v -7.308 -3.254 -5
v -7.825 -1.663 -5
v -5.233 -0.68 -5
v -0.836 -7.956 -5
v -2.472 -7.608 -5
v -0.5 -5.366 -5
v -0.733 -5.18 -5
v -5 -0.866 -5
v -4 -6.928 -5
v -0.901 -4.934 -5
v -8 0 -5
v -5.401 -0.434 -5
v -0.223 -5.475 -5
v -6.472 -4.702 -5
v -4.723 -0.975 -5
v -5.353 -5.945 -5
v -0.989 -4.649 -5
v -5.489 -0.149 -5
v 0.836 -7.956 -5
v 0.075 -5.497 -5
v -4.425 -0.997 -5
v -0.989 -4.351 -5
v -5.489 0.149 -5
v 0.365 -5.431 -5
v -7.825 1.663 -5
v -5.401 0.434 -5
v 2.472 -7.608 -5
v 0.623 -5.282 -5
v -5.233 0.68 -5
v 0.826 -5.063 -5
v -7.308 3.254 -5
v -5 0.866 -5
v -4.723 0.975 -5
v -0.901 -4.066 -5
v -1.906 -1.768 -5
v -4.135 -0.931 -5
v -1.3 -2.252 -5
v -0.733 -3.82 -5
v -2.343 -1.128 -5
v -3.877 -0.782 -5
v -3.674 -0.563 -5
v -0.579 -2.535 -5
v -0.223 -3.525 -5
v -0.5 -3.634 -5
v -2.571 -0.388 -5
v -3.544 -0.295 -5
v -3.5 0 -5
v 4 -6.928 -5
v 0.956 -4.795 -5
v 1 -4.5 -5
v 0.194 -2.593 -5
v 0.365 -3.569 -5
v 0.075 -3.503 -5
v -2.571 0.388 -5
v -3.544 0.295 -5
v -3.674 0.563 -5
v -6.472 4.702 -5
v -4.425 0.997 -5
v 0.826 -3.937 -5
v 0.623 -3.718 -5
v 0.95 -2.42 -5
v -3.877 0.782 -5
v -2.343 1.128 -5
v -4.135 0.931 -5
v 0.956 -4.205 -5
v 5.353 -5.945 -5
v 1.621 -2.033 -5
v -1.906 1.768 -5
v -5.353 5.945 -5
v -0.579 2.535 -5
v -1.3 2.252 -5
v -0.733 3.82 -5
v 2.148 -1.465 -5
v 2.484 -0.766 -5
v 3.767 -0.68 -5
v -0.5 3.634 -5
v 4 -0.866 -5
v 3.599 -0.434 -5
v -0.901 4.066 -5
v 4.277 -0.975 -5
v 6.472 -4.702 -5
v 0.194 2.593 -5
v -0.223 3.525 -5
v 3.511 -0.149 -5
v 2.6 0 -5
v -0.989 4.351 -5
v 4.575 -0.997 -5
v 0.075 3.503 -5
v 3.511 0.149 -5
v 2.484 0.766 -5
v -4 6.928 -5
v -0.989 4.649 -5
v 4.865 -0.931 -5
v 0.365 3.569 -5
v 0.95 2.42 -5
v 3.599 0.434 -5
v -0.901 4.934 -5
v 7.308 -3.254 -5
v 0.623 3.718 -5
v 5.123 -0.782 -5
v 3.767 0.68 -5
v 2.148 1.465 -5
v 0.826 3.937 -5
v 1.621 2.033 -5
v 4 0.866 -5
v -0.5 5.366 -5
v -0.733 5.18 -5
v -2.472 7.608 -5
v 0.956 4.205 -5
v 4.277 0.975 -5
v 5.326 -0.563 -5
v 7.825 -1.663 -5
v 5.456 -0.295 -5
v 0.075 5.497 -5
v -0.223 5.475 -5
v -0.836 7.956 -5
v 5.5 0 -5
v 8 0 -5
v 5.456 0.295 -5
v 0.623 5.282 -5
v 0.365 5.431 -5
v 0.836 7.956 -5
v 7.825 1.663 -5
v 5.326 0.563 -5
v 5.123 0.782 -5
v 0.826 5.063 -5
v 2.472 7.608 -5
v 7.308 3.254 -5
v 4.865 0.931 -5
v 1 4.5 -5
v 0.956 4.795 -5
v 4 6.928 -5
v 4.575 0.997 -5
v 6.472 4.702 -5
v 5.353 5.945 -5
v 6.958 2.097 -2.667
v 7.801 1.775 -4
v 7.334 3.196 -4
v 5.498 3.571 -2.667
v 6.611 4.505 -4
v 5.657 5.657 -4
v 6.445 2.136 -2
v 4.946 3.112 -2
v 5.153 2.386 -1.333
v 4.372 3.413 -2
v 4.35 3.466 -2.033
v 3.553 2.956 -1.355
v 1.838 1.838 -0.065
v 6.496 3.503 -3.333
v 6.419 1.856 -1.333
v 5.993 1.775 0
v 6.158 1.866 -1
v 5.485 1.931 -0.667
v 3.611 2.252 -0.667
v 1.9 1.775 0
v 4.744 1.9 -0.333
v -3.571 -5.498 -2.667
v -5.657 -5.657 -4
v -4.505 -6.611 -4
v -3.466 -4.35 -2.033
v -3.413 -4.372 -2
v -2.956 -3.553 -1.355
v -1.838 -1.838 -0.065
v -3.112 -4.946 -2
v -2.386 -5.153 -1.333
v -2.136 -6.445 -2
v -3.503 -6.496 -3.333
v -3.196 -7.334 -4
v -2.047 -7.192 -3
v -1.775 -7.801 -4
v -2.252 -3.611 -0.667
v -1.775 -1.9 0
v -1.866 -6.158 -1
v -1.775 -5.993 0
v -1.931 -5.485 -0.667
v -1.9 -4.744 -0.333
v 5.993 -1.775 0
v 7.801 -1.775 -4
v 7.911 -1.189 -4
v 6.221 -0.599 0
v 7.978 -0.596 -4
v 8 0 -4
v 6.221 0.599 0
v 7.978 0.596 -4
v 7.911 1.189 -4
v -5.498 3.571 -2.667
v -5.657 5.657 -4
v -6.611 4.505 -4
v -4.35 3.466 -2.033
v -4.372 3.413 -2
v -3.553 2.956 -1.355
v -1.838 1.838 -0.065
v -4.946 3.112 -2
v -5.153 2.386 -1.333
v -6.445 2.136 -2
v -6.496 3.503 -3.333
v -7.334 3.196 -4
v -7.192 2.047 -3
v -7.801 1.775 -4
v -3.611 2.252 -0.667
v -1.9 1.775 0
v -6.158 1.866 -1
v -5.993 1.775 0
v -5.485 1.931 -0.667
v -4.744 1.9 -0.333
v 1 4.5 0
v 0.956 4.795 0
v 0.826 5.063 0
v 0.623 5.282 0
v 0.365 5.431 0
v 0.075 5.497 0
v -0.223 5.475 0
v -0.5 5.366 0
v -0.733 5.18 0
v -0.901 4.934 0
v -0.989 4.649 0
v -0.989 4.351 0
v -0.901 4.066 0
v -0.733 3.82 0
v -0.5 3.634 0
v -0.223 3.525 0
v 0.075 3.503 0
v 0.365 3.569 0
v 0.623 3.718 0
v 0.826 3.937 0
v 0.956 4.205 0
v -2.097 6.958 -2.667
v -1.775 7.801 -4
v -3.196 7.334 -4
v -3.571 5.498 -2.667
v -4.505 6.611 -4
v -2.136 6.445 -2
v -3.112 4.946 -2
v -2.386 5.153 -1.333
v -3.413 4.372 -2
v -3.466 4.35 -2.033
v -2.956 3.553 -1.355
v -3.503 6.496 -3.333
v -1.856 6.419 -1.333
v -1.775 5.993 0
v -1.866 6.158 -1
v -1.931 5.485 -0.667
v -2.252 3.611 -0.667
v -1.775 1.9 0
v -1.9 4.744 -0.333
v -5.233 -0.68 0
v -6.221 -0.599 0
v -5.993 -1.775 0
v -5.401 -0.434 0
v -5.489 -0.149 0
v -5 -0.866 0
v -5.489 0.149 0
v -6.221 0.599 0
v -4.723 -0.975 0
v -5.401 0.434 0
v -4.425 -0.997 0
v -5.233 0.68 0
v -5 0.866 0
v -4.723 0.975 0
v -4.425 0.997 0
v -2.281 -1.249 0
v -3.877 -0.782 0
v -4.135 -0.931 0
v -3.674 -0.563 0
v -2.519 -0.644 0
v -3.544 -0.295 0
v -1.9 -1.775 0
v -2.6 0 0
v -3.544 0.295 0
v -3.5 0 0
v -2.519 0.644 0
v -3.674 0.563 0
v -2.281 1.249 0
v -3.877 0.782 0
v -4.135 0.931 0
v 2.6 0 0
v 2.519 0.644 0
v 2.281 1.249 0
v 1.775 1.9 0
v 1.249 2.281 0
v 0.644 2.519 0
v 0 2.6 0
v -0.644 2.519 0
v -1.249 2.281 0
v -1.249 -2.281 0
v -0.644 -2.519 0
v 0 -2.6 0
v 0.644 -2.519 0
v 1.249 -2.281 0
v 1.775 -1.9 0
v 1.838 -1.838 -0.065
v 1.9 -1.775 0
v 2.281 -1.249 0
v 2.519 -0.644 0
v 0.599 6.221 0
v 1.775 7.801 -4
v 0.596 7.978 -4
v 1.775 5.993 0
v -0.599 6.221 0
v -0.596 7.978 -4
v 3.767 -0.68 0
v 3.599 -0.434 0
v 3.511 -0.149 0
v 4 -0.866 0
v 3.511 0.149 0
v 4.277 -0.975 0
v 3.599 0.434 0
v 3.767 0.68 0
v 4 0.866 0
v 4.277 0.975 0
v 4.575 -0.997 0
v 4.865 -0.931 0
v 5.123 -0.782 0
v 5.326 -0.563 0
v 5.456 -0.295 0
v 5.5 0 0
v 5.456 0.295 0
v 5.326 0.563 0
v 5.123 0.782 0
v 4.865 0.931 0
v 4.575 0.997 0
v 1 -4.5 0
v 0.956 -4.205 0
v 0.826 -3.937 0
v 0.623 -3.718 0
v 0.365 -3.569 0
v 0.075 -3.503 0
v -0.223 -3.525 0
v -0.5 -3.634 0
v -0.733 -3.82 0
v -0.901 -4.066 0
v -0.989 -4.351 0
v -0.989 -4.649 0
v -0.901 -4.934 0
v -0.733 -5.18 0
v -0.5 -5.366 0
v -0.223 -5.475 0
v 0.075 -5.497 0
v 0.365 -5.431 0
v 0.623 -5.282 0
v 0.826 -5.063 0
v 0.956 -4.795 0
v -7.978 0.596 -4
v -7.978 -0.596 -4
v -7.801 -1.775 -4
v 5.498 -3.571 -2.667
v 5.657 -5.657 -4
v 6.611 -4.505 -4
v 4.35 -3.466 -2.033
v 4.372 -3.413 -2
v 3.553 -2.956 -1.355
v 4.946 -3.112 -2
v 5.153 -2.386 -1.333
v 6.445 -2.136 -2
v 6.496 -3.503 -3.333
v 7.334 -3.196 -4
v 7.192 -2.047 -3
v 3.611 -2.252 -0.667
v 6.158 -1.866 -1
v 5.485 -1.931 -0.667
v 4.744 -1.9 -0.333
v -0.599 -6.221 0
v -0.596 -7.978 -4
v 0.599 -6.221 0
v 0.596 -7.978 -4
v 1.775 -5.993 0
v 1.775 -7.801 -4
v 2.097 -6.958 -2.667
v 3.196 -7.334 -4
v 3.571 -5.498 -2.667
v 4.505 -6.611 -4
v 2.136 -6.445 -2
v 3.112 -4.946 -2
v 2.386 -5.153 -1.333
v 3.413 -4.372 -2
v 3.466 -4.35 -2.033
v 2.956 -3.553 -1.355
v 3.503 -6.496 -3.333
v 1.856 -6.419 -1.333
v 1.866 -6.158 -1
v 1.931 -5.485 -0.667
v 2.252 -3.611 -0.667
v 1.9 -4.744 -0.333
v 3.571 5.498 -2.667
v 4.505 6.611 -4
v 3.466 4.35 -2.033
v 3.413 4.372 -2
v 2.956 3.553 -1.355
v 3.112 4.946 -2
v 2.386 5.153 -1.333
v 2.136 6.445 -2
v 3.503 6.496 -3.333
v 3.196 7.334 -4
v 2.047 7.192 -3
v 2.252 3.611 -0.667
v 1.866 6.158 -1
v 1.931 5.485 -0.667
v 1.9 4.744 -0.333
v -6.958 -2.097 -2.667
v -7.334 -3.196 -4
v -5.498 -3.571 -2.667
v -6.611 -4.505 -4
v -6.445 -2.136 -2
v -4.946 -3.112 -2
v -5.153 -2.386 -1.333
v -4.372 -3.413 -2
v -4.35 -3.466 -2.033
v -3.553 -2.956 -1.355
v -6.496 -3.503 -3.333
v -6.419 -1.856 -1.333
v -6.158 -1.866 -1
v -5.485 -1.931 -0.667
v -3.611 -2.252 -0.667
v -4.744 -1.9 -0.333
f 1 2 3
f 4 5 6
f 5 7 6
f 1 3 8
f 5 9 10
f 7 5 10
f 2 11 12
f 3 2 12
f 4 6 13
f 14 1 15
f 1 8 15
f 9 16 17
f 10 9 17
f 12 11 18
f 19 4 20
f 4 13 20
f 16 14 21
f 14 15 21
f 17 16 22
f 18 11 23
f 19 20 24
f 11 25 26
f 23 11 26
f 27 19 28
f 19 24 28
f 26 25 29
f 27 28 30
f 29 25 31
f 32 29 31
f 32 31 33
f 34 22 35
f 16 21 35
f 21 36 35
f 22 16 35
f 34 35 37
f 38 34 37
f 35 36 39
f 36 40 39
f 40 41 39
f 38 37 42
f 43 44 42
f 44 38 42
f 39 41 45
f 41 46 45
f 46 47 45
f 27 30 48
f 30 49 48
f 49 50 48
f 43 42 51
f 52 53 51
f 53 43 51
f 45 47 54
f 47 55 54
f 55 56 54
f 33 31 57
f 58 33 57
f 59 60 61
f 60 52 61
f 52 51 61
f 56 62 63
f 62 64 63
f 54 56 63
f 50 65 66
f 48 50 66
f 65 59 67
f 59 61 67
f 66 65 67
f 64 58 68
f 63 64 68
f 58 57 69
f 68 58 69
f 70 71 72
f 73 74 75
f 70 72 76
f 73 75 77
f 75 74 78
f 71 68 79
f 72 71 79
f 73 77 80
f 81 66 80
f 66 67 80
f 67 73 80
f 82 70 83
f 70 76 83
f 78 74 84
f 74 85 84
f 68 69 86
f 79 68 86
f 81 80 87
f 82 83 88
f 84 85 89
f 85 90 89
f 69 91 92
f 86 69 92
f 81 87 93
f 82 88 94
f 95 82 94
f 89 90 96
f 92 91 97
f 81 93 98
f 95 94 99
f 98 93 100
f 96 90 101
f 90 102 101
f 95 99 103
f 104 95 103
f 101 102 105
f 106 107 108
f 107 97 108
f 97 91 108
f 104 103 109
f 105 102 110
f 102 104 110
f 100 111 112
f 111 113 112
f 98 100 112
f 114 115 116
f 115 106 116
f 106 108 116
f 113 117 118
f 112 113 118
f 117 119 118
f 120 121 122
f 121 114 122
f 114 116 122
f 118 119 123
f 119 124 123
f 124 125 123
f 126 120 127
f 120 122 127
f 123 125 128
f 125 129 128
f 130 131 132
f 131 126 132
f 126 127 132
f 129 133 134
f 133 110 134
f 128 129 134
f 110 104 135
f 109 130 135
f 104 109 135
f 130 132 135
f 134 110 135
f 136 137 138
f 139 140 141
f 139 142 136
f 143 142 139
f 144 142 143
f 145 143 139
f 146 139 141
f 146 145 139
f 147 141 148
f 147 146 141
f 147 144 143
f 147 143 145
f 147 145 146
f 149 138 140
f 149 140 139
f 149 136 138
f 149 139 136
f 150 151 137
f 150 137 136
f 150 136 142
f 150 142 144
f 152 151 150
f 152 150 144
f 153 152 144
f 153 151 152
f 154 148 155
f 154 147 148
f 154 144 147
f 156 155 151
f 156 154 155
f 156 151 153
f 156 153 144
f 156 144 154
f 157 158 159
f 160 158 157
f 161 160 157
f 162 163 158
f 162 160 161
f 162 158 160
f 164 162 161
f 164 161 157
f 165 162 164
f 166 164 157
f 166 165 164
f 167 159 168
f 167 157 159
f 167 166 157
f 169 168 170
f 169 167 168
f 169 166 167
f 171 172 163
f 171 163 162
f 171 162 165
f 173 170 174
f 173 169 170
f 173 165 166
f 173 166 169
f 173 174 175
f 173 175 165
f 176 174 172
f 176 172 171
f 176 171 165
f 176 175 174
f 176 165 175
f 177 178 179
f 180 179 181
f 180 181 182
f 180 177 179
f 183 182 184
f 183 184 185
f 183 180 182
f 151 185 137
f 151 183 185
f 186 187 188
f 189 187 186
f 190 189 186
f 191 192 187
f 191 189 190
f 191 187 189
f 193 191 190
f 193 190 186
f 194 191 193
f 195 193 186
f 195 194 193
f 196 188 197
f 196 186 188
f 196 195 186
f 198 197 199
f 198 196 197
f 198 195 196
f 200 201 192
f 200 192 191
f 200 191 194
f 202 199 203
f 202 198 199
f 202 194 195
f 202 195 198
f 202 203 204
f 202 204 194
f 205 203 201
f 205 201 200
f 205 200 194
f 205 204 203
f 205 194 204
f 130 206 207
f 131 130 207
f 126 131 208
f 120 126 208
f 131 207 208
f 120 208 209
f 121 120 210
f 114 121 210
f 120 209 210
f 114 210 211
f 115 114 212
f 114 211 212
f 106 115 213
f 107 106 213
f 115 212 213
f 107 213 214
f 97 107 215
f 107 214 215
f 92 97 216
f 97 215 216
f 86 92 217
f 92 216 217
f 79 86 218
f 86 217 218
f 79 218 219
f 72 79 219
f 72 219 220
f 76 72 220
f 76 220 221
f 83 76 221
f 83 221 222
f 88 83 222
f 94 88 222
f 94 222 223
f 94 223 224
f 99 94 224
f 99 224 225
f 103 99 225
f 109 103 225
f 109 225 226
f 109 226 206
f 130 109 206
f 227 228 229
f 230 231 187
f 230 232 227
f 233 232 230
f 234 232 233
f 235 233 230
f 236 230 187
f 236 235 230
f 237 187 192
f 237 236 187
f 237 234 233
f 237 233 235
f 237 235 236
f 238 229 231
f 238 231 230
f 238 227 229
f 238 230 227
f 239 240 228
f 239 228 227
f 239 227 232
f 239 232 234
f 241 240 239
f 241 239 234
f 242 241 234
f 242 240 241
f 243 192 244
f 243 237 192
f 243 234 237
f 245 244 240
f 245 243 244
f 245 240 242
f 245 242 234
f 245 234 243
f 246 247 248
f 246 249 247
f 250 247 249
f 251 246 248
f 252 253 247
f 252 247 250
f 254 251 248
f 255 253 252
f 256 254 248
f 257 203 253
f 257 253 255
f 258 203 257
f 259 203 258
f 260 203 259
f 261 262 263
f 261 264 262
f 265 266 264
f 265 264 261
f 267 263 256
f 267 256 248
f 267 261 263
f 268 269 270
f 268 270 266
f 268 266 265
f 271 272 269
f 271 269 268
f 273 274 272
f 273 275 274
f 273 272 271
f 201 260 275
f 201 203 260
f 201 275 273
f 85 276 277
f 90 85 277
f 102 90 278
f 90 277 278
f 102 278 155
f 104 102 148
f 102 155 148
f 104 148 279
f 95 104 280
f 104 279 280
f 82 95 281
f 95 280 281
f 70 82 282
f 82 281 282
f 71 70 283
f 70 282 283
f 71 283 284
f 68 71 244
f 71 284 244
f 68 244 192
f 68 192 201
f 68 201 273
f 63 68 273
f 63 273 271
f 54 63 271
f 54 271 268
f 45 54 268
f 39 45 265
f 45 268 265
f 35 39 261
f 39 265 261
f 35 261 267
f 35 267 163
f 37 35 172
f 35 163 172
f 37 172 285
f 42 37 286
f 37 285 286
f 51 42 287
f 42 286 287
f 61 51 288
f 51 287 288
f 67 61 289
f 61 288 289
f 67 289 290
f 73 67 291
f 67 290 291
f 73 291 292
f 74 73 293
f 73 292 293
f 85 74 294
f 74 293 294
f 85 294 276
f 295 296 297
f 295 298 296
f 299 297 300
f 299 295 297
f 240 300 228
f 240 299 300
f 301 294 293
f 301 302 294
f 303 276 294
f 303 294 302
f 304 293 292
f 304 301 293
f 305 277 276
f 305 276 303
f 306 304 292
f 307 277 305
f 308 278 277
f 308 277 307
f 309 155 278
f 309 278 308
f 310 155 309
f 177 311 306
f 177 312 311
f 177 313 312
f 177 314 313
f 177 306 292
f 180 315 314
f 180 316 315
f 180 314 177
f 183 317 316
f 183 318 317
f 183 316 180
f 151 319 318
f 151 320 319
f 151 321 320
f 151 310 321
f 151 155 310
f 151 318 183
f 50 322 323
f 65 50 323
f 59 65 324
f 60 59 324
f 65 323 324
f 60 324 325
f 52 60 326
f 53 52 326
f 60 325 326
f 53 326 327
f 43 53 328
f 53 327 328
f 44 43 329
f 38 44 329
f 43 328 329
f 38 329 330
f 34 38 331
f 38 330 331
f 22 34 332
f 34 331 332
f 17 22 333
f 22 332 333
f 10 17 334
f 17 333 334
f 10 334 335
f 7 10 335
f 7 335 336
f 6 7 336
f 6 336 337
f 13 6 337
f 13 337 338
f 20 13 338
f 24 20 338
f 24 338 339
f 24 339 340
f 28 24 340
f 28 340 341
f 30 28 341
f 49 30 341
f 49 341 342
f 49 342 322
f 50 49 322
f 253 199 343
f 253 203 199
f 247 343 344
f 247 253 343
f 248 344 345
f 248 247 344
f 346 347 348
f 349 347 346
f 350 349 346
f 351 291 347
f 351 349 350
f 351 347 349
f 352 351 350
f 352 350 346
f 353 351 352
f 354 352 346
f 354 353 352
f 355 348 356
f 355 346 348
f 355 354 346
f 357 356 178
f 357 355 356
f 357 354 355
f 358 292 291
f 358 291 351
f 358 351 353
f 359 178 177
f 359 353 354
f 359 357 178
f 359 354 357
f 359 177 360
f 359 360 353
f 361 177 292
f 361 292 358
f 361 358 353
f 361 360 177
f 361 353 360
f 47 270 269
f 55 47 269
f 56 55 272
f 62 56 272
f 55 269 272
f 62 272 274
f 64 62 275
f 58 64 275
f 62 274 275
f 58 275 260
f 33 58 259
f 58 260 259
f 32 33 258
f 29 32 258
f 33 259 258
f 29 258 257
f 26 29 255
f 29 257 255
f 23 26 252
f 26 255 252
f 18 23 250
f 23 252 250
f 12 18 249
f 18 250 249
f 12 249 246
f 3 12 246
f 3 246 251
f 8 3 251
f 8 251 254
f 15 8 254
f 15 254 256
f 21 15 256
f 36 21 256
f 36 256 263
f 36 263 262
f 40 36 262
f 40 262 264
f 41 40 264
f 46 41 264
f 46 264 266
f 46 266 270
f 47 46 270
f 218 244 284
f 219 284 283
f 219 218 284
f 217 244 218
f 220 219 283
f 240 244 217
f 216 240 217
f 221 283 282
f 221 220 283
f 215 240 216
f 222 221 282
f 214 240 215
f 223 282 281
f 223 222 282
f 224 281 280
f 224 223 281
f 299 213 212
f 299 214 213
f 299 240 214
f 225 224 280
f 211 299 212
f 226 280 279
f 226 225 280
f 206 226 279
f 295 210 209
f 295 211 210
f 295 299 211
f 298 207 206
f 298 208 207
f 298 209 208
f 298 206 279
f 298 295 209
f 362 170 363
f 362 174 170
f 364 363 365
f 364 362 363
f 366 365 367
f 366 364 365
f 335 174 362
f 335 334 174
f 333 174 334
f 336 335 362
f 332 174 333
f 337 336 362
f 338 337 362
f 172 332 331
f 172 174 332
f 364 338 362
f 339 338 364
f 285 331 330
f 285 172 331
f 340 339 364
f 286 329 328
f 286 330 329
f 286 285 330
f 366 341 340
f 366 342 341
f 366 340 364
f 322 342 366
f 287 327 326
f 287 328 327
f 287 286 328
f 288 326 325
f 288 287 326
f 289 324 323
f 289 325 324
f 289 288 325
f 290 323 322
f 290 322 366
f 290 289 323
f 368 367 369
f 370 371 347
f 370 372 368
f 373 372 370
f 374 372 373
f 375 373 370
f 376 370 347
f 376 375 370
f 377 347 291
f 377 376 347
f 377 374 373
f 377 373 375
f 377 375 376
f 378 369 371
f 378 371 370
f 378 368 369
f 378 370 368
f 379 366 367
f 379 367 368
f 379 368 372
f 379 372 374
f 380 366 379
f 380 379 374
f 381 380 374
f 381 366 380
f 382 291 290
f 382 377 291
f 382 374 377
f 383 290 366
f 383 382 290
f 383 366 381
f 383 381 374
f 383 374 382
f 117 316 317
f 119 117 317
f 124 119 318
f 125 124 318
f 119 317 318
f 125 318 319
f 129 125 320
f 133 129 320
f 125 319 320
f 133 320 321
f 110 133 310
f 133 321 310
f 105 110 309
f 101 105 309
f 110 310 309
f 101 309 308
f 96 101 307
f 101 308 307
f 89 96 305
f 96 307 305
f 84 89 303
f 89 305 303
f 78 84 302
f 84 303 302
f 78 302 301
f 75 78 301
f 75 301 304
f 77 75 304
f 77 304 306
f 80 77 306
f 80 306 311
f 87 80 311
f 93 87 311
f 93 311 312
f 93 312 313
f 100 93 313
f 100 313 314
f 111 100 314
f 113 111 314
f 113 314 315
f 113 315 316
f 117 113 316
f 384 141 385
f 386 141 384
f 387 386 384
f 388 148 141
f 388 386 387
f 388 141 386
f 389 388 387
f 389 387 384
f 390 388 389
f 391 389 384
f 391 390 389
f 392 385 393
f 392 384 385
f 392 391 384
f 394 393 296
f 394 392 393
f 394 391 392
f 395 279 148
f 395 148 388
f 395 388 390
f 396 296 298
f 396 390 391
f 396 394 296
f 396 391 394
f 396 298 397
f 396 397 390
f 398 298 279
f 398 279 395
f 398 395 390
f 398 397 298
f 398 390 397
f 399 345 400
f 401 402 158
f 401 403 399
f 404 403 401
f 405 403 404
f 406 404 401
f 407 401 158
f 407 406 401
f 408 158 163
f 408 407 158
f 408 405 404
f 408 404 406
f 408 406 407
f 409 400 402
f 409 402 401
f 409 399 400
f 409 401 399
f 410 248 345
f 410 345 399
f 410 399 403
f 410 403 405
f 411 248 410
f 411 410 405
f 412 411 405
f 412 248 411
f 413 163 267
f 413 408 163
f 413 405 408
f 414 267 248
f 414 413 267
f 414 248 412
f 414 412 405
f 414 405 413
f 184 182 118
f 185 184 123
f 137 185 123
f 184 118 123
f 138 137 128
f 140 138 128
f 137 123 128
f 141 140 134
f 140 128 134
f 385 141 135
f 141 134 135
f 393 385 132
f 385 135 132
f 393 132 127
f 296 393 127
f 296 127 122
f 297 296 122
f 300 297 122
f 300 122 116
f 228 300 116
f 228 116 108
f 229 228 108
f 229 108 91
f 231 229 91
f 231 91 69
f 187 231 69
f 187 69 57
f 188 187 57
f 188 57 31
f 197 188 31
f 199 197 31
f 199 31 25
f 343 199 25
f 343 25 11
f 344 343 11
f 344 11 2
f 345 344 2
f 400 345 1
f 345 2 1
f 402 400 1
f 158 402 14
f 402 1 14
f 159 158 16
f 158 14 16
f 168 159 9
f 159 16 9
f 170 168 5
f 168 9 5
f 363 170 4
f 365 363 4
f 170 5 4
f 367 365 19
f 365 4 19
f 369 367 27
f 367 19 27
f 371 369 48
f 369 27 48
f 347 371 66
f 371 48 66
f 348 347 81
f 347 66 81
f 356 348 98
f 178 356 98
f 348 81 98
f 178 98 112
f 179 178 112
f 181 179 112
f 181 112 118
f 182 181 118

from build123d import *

# Parameters (mm, degrees)
F2_R      = 8
F3_DEPTH  = 1
F9_R      = 1
F9_R_2    = 2.6
F10_DEPTH = 5.001


with BuildPart() as f3:
    # F2 (on offset) → F3 (new body)
    with BuildSketch(Plane.XY.offset(-5)):
        Circle(F2_R)
    extrude(amount=F3_DEPTH)

    # F4 (on face) → F5 section 0
    with BuildSketch(Plane.XY.offset(-4)):
        with BuildLine():
            Line((0, 0), (5.6568542495, 5.6568542495))
            ThreePointArc((5.6568542495, 5.6568542495), (3.8674315589, 7.0030688371), (1.775, 7.8006009384))
            ThreePointArc((1.775, 7.8006009384), (0, 8), (-1.775, 7.8006009384))
            ThreePointArc((-1.775, 7.8006009384), (-3.8674315589, 7.0030688371), (-5.6568542495, 5.6568542495))
            Line((-5.6568542495, 5.6568542495), (0, 0))
        make_face()
    # F0 (on Top) → F5 section 1
    with BuildSketch(Plane.XY):
        with BuildLine():
            Line((1.775, 1.775), (1.775, 5.9926517503))
            ThreePointArc((1.775, 5.9926517503), (0, 6.25), (-1.775, 5.9926517503))
            Line((-1.775, 5.9926517503), (-1.775, 1.775))
            Line((-1.775, 1.775), (0, 0))
            Line((0, 0), (1.775, 1.775))
        make_face()
    loft()

    # F4 (on face) → F6 section 0
    with BuildSketch(Plane.XY.offset(-4)):
        with BuildLine():
            Line((-5.6568542495, -5.6568542495), (0, 0))
            Line((0, 0), (-5.6568542495, 5.6568542495))
            ThreePointArc((-5.6568542495, 5.6568542495), (-7.0030688371, 3.8674315589), (-7.8006009384, 1.775))
            ThreePointArc((-7.8006009384, 1.775), (-8, 0), (-7.8006009384, -1.775))
            ThreePointArc((-7.8006009384, -1.775), (-7.0030688371, -3.8674315589), (-5.6568542495, -5.6568542495))
        make_face()
    # F0 (on Top) → F6 section 1
    with BuildSketch(Plane.XY):
        with BuildLine():
            Line((-1.775, -1.775), (0, 0))
            Line((0, 0), (-1.775, 1.775))
            Line((-1.775, 1.775), (-5.9926517503, 1.775))
            ThreePointArc((-5.9926517503, 1.775), (-6.25, 0), (-5.9926517503, -1.775))
            Line((-5.9926517503, -1.775), (-1.775, -1.775))
        make_face()
    loft()

    # F4 (on face) → F7 section 0
    with BuildSketch(Plane.XY.offset(-4)):
        with BuildLine():
            Line((5.6568542495, -5.6568542495), (0, 0))
            Line((0, 0), (-5.6568542495, -5.6568542495))
            ThreePointArc((-5.6568542495, -5.6568542495), (-3.8674315589, -7.0030688371), (-1.775, -7.8006009384))
            ThreePointArc((-1.775, -7.8006009384), (0, -8), (1.775, -7.8006009384))
            ThreePointArc((1.775, -7.8006009384), (3.8674315589, -7.0030688371), (5.6568542495, -5.6568542495))
        make_face()
    # F0 (on Top) → F7 section 1
    with BuildSketch(Plane.XY):
        with BuildLine():
            Line((1.775, -1.775), (0, 0))
            Line((0, 0), (-1.775, -1.775))
            Line((-1.775, -1.775), (-1.775, -5.9926517503))
            ThreePointArc((-1.775, -5.9926517503), (0, -6.25), (1.775, -5.9926517503))
            Line((1.775, -5.9926517503), (1.775, -1.775))
        make_face()
    loft()

    # F4 (on face) → F8 section 0
    with BuildSketch(Plane.XY.offset(-4)):
        with BuildLine():
            ThreePointArc((7.8006009384, 1.775), (7.0030688371, 3.8674315589), (5.6568542495, 5.6568542495))
            Line((5.6568542495, 5.6568542495), (0, 0))
            Line((0, 0), (5.6568542495, -5.6568542495))
            ThreePointArc((5.6568542495, -5.6568542495), (7.0030688371, -3.8674315589), (7.8006009384, -1.775))
            ThreePointArc((7.8006009384, -1.775), (8, 0), (7.8006009384, 1.775))
        make_face()
    # F0 (on Top) → F8 section 1
    with BuildSketch(Plane.XY):
        with BuildLine():
            Line((5.9926517503, 1.775), (1.775, 1.775))
            Line((1.775, 1.775), (0, 0))
            Line((0, 0), (1.775, -1.775))
            Line((1.775, -1.775), (5.9926517503, -1.775))
            ThreePointArc((5.9926517503, -1.775), (6.25, 0), (5.9926517503, 1.775))
        make_face()
    loft()

    # F9 (on Top) → F10 (cut, through all)
    with BuildSketch(Plane.XY):
        with Locations((0, 4.5)):
            Circle(F9_R)
        with Locations((4.5, 0)):
            Circle(F9_R)
        with Locations((0, -4.5)):
            Circle(F9_R)
        with Locations((-4.5, 0)):
            Circle(F9_R)
        Circle(F9_R_2)
    extrude(amount=-F10_DEPTH, mode=Mode.SUBTRACT)


solid = f3.part
